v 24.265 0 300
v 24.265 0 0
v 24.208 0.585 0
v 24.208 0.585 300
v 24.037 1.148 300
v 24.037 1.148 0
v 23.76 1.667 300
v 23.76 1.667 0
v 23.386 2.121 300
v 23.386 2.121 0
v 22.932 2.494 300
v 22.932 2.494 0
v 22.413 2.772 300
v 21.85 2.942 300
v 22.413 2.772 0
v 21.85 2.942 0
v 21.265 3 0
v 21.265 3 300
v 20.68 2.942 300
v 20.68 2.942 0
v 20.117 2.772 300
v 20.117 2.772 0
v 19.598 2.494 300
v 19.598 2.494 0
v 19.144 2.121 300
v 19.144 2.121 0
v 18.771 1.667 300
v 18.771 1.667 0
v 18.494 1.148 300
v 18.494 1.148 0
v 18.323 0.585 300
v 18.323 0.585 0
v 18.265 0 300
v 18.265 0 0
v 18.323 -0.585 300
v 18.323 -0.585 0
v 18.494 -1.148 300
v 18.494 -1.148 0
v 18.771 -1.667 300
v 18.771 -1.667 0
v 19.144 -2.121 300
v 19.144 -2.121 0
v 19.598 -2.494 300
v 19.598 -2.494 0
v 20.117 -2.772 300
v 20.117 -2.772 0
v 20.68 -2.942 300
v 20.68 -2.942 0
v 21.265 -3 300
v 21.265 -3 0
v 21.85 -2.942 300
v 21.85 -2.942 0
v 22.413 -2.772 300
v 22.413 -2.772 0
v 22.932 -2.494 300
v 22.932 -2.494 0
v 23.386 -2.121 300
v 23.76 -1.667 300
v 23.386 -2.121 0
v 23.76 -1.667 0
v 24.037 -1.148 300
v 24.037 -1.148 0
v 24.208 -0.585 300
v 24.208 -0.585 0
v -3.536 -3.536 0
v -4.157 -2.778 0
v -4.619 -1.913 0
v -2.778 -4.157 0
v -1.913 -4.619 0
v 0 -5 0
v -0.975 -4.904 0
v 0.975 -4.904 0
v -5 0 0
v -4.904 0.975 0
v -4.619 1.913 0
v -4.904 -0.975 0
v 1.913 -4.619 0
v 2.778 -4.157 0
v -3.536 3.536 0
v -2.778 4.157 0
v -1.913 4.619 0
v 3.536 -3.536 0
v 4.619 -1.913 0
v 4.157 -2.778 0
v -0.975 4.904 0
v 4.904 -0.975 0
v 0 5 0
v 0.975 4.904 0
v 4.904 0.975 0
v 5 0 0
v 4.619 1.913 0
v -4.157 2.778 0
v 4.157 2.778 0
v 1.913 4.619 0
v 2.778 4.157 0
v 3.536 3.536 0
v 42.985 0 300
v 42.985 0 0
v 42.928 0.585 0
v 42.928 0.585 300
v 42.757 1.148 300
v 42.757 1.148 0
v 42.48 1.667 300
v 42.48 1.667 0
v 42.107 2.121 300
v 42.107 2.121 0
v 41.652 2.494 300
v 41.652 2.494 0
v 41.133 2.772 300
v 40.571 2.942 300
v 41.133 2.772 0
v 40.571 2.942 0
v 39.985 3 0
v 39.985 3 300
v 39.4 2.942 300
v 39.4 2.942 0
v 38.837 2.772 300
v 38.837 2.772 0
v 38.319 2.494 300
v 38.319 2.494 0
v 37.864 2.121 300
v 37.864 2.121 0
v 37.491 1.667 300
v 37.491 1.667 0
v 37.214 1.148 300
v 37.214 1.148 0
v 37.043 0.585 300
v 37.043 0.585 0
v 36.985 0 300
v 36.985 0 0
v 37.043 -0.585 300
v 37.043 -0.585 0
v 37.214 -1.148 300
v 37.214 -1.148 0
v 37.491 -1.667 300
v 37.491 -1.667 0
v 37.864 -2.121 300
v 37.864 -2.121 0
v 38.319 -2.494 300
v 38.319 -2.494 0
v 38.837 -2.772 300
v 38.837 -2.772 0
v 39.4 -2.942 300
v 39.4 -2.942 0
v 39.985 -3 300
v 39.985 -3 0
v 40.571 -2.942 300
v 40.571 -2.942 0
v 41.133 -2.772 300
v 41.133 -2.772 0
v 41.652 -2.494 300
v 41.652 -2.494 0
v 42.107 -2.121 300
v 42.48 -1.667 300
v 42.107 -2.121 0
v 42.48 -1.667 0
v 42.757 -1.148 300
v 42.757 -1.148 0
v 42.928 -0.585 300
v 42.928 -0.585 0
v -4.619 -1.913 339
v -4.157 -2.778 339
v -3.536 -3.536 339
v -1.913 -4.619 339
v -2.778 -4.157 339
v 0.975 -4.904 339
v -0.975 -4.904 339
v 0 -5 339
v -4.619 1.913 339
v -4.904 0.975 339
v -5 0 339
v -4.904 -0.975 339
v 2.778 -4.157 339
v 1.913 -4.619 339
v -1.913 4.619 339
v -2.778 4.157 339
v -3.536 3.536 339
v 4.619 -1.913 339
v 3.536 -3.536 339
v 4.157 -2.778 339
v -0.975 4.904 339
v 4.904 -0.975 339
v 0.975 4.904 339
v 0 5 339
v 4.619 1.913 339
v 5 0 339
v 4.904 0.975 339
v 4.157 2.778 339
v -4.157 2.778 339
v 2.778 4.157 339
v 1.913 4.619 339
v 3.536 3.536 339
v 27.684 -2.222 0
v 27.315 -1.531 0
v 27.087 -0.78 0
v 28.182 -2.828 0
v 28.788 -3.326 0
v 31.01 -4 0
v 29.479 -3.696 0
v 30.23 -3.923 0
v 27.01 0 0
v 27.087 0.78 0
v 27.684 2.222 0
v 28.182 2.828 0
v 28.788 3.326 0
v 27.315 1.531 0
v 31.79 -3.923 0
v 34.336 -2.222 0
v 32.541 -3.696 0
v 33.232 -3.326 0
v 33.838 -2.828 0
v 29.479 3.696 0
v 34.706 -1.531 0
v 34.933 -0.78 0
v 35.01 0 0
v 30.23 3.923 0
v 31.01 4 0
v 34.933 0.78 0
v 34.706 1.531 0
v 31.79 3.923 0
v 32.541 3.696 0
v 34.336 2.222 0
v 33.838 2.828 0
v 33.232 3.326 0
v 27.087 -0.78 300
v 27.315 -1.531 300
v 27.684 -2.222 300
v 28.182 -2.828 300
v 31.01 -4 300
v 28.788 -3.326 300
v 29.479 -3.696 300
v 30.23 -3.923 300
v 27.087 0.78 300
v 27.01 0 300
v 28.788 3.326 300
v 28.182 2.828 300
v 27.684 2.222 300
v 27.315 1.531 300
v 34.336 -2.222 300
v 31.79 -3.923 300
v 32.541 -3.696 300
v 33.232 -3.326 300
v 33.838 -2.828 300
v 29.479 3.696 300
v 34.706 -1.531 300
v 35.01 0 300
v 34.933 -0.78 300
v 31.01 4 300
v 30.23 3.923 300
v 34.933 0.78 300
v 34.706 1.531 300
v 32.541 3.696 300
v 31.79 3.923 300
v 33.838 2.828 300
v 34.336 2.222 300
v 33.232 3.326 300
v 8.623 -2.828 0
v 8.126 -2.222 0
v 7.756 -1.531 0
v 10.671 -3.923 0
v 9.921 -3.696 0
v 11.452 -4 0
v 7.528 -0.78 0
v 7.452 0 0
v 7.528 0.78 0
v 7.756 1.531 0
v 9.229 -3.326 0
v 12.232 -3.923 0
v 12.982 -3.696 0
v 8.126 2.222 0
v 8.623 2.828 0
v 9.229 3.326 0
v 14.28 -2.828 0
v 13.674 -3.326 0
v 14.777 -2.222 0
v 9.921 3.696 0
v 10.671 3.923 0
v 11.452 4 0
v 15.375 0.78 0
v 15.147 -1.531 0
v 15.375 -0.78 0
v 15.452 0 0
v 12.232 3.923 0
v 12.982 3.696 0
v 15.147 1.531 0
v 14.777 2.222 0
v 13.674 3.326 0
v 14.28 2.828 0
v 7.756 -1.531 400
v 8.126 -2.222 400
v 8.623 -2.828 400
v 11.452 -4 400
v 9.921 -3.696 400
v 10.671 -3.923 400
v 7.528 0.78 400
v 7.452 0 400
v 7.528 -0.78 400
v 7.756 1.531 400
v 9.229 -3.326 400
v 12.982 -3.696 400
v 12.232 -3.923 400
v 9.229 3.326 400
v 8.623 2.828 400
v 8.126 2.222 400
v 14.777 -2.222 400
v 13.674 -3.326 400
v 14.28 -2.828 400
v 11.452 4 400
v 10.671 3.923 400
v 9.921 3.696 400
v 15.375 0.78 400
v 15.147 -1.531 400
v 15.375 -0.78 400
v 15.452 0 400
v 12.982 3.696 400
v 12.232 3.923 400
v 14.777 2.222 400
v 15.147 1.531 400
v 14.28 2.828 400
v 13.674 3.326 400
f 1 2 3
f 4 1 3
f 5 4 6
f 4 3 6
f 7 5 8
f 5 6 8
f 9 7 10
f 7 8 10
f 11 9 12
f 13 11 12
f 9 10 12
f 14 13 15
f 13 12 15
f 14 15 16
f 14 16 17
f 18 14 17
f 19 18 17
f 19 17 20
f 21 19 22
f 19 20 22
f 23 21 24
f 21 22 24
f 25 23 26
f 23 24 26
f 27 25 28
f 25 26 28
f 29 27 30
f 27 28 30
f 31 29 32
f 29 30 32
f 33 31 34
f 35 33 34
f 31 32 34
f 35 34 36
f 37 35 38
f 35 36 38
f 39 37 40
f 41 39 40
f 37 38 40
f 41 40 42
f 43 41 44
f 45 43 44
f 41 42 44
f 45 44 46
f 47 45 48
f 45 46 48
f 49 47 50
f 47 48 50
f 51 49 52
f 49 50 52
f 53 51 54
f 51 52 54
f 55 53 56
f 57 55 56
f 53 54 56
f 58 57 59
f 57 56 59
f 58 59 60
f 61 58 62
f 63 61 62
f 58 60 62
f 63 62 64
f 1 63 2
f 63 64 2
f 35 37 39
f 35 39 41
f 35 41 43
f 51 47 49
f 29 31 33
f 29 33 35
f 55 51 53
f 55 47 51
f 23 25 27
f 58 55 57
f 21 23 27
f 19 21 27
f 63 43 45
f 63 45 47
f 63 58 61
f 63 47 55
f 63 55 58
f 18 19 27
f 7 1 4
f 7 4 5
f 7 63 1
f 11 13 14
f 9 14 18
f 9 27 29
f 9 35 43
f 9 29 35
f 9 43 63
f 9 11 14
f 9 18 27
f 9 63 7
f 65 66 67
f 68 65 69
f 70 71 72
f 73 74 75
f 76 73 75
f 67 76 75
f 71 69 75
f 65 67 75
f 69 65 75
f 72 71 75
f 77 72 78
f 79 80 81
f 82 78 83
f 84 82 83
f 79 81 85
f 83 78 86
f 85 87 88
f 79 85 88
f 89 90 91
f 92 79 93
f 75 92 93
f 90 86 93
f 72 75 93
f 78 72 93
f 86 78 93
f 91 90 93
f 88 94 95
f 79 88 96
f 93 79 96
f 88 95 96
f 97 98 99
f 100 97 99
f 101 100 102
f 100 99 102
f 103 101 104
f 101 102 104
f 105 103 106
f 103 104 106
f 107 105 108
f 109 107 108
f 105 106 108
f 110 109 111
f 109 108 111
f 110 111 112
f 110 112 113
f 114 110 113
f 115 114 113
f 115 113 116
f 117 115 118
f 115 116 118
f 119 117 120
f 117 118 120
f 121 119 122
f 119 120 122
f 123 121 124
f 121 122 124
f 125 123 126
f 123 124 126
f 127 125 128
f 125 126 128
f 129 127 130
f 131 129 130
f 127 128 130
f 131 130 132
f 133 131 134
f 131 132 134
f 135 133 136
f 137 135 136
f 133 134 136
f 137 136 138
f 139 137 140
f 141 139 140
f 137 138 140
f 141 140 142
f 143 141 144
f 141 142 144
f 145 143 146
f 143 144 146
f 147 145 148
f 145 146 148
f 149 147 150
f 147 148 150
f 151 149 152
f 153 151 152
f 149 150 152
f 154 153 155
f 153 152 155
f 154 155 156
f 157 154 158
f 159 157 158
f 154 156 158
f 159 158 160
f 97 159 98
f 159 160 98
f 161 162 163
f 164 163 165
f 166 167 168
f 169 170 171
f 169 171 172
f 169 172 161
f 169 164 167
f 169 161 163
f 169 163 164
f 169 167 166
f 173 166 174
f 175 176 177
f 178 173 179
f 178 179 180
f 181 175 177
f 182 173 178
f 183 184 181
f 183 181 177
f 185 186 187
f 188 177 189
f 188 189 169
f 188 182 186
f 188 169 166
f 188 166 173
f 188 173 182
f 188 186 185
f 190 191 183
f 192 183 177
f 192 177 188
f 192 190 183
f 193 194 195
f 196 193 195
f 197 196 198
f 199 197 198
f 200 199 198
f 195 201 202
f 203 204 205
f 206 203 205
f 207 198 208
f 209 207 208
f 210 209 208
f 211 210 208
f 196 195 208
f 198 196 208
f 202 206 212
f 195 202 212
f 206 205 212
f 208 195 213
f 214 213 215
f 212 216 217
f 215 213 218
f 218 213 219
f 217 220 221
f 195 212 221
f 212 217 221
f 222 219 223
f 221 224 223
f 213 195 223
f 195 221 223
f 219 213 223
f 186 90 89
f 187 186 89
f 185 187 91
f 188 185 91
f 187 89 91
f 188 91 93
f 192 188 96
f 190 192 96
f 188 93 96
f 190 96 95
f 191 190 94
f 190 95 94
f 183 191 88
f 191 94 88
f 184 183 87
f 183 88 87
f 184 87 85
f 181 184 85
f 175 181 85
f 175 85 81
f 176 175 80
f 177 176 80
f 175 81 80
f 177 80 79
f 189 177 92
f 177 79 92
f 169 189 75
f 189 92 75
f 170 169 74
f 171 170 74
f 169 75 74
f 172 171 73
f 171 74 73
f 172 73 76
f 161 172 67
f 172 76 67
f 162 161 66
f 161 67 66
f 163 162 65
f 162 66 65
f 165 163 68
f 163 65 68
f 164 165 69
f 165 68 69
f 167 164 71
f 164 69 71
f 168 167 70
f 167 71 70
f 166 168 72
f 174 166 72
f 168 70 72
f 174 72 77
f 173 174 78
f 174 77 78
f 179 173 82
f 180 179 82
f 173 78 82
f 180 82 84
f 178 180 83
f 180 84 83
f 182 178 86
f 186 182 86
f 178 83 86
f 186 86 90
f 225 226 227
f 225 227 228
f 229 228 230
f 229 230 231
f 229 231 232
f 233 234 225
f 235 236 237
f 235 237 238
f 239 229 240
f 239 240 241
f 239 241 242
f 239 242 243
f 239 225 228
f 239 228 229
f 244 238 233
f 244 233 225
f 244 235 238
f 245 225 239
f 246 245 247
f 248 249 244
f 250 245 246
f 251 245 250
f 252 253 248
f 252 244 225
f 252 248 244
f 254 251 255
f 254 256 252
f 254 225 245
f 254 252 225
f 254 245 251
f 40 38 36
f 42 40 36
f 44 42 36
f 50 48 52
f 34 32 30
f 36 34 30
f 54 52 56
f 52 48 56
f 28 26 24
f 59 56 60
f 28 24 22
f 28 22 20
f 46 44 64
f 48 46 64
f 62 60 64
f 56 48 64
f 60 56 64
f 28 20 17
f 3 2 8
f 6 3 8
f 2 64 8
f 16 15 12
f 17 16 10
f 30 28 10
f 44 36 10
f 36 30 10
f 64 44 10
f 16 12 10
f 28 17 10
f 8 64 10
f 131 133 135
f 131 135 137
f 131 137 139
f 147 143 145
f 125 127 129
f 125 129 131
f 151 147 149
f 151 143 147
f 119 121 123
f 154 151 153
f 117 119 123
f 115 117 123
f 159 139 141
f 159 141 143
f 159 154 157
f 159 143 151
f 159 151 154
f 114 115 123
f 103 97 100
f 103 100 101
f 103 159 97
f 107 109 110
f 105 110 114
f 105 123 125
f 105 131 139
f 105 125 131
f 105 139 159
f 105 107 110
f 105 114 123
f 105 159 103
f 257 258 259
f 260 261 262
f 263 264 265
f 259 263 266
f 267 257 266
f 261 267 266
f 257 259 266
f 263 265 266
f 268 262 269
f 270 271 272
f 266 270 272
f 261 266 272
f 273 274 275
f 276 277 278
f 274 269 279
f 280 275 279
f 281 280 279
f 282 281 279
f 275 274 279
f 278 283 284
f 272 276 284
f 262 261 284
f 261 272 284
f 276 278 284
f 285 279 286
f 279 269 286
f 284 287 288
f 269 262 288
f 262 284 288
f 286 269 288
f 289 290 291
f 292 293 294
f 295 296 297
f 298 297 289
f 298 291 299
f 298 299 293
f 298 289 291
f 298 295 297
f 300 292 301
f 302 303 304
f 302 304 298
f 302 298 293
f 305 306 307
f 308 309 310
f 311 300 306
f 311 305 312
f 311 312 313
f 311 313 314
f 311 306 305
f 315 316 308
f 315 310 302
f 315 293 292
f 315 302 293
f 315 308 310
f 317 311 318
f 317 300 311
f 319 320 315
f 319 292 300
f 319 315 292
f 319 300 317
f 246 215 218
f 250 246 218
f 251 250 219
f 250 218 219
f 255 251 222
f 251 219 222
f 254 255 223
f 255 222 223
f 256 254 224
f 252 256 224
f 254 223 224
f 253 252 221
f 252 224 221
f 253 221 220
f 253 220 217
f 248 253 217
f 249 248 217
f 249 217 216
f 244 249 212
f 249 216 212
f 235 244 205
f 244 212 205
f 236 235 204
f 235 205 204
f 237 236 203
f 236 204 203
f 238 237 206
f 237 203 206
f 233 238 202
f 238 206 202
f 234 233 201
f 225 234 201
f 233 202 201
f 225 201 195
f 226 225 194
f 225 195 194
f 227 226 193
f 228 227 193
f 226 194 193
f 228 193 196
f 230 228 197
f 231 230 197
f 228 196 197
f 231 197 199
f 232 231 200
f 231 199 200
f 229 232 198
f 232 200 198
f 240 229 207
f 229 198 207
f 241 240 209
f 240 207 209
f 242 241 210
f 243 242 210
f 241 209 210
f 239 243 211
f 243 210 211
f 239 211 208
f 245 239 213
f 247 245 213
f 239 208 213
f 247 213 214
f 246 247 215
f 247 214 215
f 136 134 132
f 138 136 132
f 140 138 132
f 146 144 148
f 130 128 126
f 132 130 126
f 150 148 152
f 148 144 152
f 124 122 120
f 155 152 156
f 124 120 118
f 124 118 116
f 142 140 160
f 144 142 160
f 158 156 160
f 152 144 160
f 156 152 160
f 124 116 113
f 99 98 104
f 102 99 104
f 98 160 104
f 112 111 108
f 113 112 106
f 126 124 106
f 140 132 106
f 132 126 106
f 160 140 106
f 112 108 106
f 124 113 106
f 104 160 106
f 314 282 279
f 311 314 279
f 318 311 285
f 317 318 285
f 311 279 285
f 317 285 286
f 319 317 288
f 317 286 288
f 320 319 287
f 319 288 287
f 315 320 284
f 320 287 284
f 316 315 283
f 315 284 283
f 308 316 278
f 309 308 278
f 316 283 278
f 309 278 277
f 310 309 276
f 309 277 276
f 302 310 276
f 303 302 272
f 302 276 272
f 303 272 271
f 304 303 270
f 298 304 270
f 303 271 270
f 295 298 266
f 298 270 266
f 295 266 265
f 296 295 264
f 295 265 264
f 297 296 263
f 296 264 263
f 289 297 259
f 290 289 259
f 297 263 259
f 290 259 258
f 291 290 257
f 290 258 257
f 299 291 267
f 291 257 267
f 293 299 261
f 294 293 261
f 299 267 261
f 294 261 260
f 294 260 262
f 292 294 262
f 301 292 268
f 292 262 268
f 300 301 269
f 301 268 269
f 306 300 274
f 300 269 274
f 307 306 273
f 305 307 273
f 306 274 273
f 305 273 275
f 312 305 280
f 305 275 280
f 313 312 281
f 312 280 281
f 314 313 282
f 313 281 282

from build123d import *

# Parameters (mm, degrees)
F0_R     = 5
F1_DEPTH = 339
F0_R_2   = 4
F2_DEPTH = 300
F0_R_3   = 3
F3_DEPTH = 300
F4_DEPTH = 400
F5_DEPTH = 300


with BuildPart() as f1:
    # F0 (on Top) → F1 (new body)
    with BuildSketch(Plane.XY):
        Circle(F0_R)
    extrude(amount=F1_DEPTH)


with BuildPart() as f2:
    # F0 (on Top) → F2 (new body)
    with BuildSketch(Plane.XY):
        with Locations((31.010034, 0)):
            Circle(F0_R_2)
    extrude(amount=F2_DEPTH)


with BuildPart() as f3:
    # F0 (on Top) → F3 (new body)
    with BuildSketch(Plane.XY):
        with Locations((39.985366, 0)):
            Circle(F0_R_3)
    extrude(amount=F3_DEPTH)


with BuildPart() as f4:
    # F0 (on Top) → F4 (new body)
    with BuildSketch(Plane.XY):
        with Locations((11.451601, 0)):
            Circle(F0_R_2)
    extrude(amount=F4_DEPTH)


with BuildPart() as f5:
    # F0 (on Top) → F5 (new body)
    with BuildSketch(Plane.XY):
        with Locations((21.265149, 0)):
            Circle(F0_R_3)
    extrude(amount=F5_DEPTH)


solid = Compound([f1.part, f2.part, f3.part, f4.part, f5.part])
